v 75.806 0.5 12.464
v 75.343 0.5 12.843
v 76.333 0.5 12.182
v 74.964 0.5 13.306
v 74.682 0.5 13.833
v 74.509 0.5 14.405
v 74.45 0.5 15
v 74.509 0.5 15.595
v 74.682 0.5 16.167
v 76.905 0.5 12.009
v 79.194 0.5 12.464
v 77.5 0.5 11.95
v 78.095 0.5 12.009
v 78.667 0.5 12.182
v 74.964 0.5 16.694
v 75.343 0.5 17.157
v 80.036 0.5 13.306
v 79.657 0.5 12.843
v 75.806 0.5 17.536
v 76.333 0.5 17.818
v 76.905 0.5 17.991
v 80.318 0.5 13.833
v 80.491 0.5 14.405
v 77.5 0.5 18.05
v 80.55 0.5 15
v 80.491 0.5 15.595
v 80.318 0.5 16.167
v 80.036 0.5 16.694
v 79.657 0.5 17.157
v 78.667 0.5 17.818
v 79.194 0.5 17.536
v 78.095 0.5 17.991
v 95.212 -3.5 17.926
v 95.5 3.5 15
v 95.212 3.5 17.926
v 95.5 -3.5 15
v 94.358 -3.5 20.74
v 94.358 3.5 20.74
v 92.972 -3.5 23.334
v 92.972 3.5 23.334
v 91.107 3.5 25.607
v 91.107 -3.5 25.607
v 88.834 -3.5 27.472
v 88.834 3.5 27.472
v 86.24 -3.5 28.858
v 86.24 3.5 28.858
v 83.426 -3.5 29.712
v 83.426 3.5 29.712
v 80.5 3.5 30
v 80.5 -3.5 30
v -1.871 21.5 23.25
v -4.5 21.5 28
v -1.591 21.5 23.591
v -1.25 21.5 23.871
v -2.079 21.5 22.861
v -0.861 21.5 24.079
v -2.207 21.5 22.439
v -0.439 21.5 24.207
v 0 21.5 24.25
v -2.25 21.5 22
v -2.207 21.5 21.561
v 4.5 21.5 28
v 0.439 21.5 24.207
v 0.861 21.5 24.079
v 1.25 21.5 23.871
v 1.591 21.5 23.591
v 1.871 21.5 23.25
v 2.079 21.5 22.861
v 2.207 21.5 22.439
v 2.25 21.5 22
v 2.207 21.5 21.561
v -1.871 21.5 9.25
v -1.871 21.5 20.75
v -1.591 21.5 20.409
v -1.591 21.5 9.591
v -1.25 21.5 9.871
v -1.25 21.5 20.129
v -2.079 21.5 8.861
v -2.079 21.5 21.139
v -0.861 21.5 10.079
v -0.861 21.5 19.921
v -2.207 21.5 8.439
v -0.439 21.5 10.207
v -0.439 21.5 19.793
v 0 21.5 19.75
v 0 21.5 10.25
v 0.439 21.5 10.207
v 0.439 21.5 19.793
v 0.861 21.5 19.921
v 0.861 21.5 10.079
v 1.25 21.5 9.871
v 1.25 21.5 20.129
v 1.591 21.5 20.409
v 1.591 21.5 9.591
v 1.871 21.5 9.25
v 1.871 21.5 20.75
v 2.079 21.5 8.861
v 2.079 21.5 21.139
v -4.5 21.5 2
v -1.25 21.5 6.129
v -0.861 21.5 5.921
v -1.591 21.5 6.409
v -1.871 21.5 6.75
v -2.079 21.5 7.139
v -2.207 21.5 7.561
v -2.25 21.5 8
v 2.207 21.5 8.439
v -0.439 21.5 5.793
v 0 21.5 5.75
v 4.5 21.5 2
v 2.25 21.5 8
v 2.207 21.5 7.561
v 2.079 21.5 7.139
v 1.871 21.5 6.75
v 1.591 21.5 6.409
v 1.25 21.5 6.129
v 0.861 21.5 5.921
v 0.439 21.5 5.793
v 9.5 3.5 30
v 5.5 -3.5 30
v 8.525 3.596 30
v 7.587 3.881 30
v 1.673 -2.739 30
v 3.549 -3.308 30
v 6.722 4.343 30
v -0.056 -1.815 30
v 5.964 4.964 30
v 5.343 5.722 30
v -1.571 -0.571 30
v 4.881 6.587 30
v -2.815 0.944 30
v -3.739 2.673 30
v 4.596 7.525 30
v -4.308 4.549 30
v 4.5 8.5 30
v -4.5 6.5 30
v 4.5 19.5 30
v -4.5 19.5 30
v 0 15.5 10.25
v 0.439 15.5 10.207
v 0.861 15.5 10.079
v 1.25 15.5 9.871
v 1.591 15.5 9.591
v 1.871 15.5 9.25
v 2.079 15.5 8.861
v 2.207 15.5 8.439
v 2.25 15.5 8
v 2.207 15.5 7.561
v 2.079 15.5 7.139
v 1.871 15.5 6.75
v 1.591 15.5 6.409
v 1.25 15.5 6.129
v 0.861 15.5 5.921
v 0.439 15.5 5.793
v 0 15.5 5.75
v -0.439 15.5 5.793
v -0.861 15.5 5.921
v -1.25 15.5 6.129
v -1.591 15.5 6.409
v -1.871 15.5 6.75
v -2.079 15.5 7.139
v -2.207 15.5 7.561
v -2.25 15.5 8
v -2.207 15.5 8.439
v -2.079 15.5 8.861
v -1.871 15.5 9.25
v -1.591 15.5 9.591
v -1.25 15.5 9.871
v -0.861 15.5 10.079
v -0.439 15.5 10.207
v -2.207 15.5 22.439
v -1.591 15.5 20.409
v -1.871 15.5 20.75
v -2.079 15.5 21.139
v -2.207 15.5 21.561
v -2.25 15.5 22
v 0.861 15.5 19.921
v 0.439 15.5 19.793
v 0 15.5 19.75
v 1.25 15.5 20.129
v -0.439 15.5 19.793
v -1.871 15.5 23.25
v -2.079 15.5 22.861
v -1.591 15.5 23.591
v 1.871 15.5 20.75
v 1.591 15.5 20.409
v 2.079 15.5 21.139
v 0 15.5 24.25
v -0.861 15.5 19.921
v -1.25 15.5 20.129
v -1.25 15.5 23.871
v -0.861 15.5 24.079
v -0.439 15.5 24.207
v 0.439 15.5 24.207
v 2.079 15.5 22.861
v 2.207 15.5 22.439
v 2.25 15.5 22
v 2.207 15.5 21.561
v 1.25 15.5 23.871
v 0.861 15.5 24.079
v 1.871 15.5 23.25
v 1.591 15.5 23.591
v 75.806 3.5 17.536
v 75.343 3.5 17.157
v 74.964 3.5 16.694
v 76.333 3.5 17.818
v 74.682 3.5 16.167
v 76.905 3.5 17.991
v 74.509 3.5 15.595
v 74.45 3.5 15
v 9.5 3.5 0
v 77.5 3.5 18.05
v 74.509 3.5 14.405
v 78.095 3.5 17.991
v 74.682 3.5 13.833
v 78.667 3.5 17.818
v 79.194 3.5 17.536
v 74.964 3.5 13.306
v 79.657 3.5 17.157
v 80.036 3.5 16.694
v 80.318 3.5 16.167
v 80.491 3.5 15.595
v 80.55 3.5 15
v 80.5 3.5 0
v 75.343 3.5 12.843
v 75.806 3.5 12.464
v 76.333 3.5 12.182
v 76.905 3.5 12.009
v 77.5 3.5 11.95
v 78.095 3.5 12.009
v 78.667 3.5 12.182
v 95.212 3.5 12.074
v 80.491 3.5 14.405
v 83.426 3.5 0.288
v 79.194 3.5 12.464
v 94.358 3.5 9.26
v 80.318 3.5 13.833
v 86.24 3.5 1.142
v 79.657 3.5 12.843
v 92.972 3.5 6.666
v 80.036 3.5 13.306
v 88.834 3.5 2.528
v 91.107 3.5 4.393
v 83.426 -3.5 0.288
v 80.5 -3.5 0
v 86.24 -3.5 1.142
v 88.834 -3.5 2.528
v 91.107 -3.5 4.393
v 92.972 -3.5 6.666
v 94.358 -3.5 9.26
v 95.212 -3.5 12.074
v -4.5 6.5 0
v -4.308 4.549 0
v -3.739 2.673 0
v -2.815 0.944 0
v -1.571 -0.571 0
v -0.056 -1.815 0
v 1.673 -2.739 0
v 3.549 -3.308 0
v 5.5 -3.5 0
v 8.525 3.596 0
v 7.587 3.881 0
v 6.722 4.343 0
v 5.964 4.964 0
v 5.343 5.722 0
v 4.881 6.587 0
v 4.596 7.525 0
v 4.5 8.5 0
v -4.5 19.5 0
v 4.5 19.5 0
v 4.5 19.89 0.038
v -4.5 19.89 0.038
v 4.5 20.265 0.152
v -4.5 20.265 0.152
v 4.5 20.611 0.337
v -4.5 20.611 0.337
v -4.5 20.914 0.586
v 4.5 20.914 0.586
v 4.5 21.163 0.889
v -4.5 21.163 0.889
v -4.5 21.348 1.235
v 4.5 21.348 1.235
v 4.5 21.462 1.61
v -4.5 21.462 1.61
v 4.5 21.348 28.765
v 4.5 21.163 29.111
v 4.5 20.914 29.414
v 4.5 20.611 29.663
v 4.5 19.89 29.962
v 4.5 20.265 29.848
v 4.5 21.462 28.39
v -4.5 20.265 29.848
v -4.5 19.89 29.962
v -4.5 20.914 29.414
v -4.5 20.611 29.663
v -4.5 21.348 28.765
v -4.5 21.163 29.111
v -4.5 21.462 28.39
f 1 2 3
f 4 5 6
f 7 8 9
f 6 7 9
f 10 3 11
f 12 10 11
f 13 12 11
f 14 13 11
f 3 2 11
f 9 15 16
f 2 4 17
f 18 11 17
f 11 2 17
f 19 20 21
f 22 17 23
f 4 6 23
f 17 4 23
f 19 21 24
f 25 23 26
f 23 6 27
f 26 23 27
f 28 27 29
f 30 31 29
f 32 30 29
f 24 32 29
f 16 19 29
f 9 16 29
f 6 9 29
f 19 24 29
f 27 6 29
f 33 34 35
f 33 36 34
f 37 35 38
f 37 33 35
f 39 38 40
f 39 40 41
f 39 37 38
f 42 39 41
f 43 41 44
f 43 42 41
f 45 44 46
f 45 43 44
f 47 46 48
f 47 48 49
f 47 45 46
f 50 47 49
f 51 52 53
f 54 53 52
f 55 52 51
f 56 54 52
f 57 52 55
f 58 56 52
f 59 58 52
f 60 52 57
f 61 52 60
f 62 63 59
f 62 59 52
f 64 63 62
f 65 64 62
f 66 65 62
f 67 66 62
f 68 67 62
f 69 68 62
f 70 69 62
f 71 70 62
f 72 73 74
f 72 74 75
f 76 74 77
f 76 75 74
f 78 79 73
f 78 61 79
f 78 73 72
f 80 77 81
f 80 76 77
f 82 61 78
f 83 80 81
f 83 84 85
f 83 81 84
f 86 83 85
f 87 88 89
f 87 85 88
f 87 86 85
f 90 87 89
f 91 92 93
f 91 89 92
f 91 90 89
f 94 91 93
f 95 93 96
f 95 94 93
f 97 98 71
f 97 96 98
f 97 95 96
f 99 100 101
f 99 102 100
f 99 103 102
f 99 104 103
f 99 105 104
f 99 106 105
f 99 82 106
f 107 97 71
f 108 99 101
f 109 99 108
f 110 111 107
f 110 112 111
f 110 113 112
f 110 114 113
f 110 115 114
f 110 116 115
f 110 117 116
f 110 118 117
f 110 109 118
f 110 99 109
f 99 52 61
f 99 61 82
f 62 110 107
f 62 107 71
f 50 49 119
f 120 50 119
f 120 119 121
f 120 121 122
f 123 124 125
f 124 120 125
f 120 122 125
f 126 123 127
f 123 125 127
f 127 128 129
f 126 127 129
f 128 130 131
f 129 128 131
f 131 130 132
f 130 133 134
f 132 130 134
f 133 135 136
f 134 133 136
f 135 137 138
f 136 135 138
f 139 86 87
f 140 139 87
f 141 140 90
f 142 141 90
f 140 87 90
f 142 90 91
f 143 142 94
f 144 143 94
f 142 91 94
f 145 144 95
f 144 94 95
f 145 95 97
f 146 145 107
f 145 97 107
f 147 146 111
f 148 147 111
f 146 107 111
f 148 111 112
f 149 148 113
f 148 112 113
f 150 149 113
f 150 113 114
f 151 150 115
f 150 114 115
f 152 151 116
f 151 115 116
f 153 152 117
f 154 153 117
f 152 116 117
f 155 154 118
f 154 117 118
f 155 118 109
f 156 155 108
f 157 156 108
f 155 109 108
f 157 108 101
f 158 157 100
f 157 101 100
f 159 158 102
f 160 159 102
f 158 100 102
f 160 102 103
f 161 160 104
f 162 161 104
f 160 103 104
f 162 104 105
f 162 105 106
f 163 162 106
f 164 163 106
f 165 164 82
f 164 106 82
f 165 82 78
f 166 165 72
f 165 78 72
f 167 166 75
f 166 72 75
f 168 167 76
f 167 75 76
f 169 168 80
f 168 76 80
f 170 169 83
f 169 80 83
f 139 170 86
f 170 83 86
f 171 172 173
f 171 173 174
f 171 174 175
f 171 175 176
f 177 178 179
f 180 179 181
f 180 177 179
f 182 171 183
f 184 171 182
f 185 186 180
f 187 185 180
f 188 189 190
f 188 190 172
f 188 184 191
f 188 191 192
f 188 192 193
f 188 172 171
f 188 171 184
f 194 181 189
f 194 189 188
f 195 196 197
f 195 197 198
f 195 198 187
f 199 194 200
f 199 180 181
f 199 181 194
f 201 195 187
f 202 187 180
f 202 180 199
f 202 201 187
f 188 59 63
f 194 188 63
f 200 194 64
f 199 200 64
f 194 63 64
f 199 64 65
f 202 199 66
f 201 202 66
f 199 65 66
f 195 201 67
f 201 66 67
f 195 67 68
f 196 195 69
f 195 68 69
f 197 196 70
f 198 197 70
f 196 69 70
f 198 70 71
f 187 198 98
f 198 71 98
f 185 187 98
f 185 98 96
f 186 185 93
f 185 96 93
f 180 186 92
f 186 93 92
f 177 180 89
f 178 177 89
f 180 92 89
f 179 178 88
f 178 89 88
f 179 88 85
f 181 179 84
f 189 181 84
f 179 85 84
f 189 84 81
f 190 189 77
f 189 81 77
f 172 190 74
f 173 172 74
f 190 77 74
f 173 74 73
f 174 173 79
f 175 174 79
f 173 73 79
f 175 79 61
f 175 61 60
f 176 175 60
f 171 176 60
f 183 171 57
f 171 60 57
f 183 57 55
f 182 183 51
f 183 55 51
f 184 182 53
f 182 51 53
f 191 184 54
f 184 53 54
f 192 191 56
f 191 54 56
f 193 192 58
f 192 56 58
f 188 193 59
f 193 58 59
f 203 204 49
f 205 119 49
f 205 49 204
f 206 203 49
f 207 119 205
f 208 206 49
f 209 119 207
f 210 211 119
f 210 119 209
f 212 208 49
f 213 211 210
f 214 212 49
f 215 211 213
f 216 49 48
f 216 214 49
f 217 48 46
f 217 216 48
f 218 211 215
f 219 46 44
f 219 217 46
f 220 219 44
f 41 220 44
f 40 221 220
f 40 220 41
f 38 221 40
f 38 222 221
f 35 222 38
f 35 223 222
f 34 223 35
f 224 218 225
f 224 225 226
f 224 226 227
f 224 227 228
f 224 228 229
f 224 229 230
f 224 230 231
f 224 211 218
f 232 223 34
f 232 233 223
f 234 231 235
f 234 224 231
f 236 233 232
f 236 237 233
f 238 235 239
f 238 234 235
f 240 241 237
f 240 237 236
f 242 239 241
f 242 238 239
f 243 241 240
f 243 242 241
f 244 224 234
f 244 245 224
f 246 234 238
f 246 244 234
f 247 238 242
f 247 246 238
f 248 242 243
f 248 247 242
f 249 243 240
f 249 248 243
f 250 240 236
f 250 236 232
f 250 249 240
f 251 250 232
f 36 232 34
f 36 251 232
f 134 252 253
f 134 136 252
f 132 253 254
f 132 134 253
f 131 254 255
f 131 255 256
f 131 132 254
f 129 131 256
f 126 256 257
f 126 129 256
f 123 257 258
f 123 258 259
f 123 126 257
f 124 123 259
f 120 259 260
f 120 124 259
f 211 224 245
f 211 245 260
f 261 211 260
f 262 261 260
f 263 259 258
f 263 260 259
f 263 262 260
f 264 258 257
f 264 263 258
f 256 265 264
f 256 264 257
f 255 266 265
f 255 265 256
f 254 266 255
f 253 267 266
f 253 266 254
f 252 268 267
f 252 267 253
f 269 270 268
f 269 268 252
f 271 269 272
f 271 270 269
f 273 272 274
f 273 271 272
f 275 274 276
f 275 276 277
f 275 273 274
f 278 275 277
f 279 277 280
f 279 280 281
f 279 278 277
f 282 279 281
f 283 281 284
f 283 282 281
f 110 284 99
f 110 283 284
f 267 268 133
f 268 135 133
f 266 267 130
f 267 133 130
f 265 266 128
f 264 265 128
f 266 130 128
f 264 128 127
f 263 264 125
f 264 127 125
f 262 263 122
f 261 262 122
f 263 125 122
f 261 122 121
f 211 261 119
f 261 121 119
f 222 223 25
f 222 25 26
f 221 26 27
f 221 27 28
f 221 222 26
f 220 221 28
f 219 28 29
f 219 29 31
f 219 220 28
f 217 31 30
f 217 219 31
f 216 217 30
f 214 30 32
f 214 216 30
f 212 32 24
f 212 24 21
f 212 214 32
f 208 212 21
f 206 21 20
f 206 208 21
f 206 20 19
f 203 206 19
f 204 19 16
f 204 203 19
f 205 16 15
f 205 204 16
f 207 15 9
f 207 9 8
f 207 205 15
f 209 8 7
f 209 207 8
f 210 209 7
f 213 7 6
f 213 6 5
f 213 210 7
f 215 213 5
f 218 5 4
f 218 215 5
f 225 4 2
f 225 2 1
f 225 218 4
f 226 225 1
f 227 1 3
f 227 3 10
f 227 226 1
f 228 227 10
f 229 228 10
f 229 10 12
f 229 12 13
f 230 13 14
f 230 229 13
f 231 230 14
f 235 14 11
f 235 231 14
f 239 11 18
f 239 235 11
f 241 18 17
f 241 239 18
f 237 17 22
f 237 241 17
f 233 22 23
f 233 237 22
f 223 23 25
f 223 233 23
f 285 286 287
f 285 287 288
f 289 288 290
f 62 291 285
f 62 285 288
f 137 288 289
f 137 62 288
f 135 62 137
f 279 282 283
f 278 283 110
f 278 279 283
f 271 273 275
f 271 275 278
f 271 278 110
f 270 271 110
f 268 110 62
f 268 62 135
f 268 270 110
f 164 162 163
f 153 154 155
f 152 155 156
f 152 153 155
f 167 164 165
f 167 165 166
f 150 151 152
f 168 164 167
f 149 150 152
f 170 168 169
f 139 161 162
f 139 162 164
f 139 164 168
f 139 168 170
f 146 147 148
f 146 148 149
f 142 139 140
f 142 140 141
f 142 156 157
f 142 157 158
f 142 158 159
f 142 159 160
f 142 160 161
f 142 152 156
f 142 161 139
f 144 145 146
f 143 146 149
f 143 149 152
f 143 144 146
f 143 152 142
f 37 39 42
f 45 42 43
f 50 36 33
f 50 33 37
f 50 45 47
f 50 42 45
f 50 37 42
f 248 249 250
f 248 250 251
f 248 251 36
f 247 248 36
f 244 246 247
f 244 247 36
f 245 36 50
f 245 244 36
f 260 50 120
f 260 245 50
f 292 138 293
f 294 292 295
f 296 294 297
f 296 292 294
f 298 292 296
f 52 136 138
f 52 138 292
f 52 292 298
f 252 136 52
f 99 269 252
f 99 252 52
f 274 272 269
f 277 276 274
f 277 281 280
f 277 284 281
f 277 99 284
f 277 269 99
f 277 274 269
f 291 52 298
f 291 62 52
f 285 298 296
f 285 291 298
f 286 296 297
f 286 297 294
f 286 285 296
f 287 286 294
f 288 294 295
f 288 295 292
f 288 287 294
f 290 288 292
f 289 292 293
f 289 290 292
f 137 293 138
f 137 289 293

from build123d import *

# Parameters (mm, degrees)
BOSS_EXTRUDE1_DEPTH = 30
SKETCH2_R           = 2.25
CUT_EXTRUDE1_DEPTH  = 6
FILLET1_R           = 5
FILLET2_R           = 10
SKETCH3_R           = 3.05
CUT_EXTRUDE3_DEPTH  = 3
FILLET3_R           = 15
FILLET4_R           = 2


with BuildPart() as part:
    # Sketch1 → Boss-Extrude1 (new body)
    with BuildSketch(Plane.XY):
        Polygon((-4.5, 21.5), (4.5, 21.5), (4.5, 3.5), (95.5, 3.5), (95.5, -3.5), (-4.5, -3.5), align=None)
    extrude(amount=BOSS_EXTRUDE1_DEPTH)

    # Sketch2 → Cut-Extrude1 (cut)
    with BuildSketch(Plane(origin=(0, 21.5, 0), x_dir=(1, 0, 0), z_dir=(0, 1, 0))):
        with Locations(Location((0, -22, 0), (0, 0, 270))):
            Circle(SKETCH2_R)
        with Locations(Location((0, -8, 0), (0, 0, 270))):
            Circle(SKETCH2_R)
    extrude(amount=-CUT_EXTRUDE1_DEPTH, mode=Mode.SUBTRACT)

    # Fillet1
    fillet1_edges = [part.edges().sort_by_distance(p)[0] for p in [
        (4.5, 3.5, 15),
    ]]
    fillet(fillet1_edges, radius=FILLET1_R)

    # Fillet2
    fillet2_edges = [part.edges().sort_by_distance(p)[0] for p in [
        (-4.5, -3.5, 15),
    ]]
    fillet(fillet2_edges, radius=FILLET2_R)

    # Sketch3 → Cut-Extrude3 (cut)
    with BuildSketch(Plane.XZ.offset(-3.5)):
        with Locations((77.5, 15)):
            Circle(SKETCH3_R)
    extrude(amount=CUT_EXTRUDE3_DEPTH, mode=Mode.SUBTRACT)

    # Fillet3
    fillet3_edges = [part.edges().sort_by_distance(p)[0] for p in [
        (95.5, 0, 30),
        (95.5, 0, 0),
    ]]
    fillet(fillet3_edges, radius=FILLET3_R - 0.0001)  # a hair under: the kernel refuses the full size

    # Fillet4
    fillet4_edges = [part.edges().sort_by_distance(p)[0] for p in [
        (0, 21.5, 30),
        (0, 21.5, 0),
    ]]
    fillet(fillet4_edges, radius=FILLET4_R)


solid = part.part
